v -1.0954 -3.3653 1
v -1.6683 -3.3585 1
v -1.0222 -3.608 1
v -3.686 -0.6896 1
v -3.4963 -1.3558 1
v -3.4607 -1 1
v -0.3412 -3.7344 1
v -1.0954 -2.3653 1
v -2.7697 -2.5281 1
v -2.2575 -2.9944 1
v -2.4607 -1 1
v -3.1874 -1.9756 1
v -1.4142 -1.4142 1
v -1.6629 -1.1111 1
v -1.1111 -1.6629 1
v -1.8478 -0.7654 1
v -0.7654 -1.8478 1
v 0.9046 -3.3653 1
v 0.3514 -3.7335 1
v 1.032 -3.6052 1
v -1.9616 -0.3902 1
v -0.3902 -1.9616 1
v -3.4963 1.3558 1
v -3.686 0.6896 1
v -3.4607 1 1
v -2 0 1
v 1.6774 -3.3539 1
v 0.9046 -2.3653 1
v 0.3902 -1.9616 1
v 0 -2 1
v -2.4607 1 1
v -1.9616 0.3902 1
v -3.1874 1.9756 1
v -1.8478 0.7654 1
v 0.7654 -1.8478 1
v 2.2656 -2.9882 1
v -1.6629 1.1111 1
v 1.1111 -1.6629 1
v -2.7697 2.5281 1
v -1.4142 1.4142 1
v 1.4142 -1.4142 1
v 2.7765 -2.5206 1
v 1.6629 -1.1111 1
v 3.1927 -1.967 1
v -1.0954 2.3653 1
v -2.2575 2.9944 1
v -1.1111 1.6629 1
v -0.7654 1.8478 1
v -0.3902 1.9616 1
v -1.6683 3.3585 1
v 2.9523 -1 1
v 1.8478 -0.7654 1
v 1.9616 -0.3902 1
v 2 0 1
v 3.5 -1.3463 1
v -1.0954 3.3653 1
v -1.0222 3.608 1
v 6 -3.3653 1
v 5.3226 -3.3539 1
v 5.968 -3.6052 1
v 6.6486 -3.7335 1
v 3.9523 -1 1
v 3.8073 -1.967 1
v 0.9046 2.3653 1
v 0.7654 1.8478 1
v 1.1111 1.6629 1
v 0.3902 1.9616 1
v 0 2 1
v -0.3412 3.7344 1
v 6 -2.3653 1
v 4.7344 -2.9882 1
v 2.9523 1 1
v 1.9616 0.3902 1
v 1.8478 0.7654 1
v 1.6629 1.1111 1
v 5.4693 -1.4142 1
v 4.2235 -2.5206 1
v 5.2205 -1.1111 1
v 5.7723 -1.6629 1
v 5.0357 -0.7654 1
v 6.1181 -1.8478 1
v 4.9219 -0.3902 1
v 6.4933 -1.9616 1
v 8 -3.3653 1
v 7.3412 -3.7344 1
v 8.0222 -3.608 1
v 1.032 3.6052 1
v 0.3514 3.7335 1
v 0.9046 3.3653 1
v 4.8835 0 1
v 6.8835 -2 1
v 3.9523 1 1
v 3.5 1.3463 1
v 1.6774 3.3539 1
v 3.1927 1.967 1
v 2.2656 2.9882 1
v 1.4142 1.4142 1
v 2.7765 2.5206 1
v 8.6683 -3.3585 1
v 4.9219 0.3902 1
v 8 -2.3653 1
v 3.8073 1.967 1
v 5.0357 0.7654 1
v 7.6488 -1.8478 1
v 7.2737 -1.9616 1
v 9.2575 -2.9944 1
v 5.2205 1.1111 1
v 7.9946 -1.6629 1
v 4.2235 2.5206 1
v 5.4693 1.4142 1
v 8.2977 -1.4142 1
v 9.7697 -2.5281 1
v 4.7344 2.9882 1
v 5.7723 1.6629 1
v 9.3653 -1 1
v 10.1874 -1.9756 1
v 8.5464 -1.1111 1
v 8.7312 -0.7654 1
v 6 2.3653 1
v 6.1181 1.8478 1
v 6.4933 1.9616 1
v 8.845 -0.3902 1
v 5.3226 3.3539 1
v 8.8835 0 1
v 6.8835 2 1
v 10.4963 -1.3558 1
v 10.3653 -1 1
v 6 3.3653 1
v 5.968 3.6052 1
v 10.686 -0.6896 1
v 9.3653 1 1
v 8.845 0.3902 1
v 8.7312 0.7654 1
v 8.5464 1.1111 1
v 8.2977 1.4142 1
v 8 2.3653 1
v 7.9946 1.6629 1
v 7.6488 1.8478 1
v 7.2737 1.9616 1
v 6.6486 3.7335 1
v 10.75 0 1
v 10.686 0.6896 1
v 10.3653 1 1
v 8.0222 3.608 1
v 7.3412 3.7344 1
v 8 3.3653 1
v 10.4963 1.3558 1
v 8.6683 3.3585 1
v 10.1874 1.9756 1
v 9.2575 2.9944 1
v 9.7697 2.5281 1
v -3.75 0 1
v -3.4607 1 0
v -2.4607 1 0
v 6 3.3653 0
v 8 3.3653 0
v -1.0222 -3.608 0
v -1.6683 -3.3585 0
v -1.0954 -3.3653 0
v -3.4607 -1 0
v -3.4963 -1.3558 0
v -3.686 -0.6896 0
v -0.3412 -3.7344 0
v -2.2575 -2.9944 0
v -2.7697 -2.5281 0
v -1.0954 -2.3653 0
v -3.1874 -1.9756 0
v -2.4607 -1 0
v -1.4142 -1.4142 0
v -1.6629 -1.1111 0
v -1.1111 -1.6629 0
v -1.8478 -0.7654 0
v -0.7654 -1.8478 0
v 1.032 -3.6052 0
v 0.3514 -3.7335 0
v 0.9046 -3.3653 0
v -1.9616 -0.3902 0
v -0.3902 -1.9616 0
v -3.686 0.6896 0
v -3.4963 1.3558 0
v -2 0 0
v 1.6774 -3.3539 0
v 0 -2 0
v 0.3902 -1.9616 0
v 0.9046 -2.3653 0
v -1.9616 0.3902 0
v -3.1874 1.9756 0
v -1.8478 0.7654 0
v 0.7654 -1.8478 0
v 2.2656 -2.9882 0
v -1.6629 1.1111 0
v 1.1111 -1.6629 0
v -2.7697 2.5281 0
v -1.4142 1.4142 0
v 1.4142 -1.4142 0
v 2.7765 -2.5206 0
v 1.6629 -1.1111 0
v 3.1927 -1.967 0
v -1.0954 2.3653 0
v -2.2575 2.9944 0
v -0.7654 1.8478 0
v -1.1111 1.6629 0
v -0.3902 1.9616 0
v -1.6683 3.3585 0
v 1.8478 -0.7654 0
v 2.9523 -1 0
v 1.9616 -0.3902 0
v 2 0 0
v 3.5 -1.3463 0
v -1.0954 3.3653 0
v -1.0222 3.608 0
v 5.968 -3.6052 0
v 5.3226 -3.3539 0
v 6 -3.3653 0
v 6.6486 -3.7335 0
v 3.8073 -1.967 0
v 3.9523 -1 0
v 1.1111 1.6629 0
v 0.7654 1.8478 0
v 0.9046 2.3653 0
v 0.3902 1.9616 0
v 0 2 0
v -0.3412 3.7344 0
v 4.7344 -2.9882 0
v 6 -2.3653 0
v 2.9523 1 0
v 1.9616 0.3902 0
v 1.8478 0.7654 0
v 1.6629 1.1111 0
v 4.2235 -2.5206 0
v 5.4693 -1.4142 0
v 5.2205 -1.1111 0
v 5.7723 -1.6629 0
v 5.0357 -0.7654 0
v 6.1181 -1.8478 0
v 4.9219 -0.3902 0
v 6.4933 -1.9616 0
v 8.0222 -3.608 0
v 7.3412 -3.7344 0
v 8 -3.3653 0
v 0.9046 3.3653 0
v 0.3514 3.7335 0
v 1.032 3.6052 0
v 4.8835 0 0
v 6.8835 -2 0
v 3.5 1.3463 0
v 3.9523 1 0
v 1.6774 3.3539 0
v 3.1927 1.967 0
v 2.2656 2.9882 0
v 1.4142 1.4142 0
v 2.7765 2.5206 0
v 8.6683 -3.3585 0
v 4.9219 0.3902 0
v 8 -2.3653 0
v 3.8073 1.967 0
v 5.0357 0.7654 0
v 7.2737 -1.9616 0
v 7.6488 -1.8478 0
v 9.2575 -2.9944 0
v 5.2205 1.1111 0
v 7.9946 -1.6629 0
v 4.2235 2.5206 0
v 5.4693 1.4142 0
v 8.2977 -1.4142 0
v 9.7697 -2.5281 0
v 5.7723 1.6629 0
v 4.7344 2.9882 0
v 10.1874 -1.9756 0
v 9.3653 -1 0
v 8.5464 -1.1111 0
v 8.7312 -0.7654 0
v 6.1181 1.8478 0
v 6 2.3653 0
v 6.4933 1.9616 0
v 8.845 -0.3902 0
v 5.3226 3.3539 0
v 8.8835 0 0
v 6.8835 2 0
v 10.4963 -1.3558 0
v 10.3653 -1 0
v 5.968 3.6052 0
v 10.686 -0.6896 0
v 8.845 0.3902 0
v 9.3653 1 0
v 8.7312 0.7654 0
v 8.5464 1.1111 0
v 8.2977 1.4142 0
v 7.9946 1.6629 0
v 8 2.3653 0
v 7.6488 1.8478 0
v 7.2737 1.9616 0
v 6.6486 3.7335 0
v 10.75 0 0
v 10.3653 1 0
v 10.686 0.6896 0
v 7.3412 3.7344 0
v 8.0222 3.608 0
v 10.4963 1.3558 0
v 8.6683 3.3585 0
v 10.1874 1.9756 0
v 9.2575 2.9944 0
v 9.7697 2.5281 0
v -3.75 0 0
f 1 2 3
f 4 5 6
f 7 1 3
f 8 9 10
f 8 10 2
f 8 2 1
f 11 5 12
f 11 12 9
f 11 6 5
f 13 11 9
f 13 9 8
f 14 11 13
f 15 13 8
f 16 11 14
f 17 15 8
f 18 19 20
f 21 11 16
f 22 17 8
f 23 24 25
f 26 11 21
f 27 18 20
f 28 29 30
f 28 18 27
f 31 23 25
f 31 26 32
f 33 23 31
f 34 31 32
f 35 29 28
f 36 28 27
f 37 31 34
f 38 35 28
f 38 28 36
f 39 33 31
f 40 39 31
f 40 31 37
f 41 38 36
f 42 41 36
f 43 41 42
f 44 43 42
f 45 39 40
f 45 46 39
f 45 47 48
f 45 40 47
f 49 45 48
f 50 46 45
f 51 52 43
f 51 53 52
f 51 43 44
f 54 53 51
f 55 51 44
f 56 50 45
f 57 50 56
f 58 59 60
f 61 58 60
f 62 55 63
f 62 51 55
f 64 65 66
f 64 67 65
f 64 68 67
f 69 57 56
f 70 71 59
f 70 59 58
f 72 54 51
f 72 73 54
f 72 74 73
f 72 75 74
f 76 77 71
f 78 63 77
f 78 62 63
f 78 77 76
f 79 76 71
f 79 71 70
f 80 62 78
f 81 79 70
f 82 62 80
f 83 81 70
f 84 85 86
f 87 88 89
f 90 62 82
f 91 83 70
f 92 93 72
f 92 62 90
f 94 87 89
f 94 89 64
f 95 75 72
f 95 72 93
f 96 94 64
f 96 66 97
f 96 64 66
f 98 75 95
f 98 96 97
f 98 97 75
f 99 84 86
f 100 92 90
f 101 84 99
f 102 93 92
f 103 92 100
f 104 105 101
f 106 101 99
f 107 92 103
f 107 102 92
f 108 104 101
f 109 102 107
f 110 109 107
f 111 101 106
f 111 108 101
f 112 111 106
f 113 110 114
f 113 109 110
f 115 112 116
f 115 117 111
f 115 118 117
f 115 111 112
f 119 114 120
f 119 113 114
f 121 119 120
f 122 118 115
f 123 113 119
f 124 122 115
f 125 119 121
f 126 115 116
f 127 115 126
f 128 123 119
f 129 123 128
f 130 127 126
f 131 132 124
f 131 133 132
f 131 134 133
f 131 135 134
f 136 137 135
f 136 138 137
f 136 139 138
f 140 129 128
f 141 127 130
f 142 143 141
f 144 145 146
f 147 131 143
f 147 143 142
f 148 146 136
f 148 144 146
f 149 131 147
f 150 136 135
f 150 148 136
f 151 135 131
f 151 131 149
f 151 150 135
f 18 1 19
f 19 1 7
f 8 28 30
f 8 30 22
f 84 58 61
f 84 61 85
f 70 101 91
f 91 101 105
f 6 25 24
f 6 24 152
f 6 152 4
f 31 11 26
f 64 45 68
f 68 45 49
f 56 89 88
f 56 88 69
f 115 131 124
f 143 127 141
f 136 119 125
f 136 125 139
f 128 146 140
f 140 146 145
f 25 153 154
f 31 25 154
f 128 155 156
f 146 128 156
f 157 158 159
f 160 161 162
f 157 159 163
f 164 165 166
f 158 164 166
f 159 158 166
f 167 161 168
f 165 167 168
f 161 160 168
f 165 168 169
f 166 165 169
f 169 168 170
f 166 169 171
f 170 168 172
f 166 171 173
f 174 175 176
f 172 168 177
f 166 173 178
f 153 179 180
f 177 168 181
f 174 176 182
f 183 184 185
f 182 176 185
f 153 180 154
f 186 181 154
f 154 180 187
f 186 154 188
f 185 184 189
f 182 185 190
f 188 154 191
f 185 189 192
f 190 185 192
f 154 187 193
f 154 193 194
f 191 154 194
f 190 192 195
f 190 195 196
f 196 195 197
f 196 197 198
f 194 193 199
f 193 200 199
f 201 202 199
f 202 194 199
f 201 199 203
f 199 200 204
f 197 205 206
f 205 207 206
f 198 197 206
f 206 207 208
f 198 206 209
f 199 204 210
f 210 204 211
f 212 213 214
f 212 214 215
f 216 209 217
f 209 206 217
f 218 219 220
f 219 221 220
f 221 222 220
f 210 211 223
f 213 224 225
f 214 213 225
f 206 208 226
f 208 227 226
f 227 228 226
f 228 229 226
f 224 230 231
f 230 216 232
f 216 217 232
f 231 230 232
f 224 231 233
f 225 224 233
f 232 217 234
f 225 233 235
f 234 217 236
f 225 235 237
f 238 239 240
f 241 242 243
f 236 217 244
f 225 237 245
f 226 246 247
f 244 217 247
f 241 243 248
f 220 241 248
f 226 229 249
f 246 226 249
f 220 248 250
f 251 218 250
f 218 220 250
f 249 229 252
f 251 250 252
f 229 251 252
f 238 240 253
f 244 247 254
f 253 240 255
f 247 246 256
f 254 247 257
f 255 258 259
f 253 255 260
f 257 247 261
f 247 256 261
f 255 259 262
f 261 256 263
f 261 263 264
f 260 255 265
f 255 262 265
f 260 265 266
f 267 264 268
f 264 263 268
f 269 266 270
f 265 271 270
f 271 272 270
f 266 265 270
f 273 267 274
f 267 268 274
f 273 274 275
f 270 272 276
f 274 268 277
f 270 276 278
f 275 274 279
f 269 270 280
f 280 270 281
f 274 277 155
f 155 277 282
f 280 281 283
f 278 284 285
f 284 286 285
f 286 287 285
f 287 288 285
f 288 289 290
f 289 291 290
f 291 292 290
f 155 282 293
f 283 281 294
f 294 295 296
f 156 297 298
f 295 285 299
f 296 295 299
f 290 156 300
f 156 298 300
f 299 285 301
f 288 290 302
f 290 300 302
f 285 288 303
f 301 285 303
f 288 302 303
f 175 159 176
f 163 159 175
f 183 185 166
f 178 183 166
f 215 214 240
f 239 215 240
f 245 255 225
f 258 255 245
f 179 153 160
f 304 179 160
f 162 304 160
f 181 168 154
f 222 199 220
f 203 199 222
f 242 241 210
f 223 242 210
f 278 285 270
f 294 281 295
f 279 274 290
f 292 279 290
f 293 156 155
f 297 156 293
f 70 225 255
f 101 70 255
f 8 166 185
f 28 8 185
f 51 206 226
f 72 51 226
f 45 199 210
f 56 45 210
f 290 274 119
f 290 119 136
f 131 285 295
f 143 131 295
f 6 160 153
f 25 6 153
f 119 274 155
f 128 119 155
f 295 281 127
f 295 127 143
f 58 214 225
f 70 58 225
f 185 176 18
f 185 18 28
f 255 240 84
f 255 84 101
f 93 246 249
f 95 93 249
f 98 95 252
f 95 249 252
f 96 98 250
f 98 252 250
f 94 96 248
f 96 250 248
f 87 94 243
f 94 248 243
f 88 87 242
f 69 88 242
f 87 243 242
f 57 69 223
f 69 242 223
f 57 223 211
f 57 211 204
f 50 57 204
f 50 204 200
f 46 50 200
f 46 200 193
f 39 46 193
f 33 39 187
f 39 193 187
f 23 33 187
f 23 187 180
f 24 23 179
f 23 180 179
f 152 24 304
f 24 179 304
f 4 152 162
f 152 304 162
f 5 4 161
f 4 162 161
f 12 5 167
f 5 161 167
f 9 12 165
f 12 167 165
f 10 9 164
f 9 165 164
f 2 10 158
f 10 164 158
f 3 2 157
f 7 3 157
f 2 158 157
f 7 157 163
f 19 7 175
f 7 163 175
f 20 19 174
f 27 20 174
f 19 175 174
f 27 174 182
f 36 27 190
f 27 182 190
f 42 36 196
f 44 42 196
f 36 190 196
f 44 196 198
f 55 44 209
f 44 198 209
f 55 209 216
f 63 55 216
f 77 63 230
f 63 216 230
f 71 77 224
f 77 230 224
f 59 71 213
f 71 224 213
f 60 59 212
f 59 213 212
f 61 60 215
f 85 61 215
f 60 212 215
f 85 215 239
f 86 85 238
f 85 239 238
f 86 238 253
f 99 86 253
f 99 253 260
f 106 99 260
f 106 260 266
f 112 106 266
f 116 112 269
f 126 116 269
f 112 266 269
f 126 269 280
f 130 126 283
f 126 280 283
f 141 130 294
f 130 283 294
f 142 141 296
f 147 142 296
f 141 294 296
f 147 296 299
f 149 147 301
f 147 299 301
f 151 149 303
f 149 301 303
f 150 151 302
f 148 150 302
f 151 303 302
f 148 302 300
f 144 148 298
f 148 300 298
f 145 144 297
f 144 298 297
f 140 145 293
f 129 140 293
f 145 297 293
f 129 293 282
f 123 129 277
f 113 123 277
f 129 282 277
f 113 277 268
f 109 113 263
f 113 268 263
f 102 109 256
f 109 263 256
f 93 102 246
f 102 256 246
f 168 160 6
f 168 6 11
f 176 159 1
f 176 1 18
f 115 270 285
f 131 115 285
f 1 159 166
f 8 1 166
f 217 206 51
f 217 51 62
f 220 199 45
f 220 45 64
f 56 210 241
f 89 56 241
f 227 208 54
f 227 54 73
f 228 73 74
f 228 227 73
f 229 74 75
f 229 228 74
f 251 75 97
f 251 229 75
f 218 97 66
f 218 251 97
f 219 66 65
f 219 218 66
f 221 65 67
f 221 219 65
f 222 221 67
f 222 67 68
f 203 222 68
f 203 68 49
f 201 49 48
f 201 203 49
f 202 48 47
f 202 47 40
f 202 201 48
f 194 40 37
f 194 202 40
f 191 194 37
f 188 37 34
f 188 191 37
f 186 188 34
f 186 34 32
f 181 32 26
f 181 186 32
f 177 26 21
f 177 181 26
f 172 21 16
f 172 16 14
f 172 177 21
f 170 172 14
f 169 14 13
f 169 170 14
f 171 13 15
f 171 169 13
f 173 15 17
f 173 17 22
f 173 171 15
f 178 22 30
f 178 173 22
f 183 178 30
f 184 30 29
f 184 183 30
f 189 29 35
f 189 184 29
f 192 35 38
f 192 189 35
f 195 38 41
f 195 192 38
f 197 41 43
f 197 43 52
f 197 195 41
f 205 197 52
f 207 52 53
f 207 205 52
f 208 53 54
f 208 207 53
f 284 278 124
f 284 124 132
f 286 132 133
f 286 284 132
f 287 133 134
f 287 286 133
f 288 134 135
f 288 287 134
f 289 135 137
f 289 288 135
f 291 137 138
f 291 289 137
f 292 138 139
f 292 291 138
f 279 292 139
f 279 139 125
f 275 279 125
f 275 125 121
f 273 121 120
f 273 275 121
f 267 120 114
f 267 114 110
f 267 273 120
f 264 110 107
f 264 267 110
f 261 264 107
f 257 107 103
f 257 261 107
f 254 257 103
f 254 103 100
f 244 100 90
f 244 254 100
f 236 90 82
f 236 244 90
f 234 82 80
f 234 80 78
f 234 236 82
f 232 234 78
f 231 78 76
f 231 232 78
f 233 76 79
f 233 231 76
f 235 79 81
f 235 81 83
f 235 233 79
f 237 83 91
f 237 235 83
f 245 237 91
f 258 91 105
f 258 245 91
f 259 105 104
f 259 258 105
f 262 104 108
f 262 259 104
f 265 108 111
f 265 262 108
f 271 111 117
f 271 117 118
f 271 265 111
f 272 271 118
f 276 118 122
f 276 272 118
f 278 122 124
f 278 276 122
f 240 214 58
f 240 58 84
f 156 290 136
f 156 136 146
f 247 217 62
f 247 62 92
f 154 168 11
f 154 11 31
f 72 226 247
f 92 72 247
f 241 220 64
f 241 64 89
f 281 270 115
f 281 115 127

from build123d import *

# Parameters (mm, degrees)
SKETCH1_R           = 3.75
BOSS_EXTRUDE1_DEPTH = 1
SKETCH2_R           = 2
CUT_EXTRUDE3_DEPTH  = 1
SKETCH3_W           = 2
SKETCH3_H           = 1
SKETCH3_W_2         = 1
SKETCH3_H_2         = 2
CUT_EXTRUDE4_DEPTH  = 1


with BuildPart() as part:
    # Sketch1 → Boss-Extrude1 (new body)
    with BuildSketch(Plane.XY):
        Circle(SKETCH1_R)
        with Locations((7, 0)):
            Circle(SKETCH1_R)
    extrude(amount=BOSS_EXTRUDE1_DEPTH)

    # Sketch2 → Cut-Extrude3 (cut)
    with BuildSketch(Plane.XY):
        Circle(SKETCH2_R)
        with Locations((6.883478598, 0)):
            Circle(SKETCH2_R)
    extrude(amount=CUT_EXTRUDE3_DEPTH, mode=Mode.SUBTRACT)

    # Sketch3 → Cut-Extrude4 (cut)
    with BuildSketch(Plane.XY):
        with Locations((7, -2.86532029)):
            Rectangle(SKETCH3_W, SKETCH3_H)
        with Locations((9.86532029, 0)):
            Rectangle(SKETCH3_W_2, SKETCH3_H_2)
        with Locations((7, 2.86532029)):
            Rectangle(SKETCH3_W, SKETCH3_H)
        with Locations((-0.095382463, -2.86532029)):
            Rectangle(SKETCH3_W, SKETCH3_H)
        with Locations((-0.095382463, 2.86532029)):
            Rectangle(SKETCH3_W, SKETCH3_H)
        with Locations((-2.960702753, 0)):
            Rectangle(SKETCH3_W_2, SKETCH3_H_2)
        with Locations((3.452308768, 0)):
            Rectangle(SKETCH3_W_2, SKETCH3_H_2)
    extrude(amount=CUT_EXTRUDE4_DEPTH, mode=Mode.SUBTRACT)


solid = part.part
